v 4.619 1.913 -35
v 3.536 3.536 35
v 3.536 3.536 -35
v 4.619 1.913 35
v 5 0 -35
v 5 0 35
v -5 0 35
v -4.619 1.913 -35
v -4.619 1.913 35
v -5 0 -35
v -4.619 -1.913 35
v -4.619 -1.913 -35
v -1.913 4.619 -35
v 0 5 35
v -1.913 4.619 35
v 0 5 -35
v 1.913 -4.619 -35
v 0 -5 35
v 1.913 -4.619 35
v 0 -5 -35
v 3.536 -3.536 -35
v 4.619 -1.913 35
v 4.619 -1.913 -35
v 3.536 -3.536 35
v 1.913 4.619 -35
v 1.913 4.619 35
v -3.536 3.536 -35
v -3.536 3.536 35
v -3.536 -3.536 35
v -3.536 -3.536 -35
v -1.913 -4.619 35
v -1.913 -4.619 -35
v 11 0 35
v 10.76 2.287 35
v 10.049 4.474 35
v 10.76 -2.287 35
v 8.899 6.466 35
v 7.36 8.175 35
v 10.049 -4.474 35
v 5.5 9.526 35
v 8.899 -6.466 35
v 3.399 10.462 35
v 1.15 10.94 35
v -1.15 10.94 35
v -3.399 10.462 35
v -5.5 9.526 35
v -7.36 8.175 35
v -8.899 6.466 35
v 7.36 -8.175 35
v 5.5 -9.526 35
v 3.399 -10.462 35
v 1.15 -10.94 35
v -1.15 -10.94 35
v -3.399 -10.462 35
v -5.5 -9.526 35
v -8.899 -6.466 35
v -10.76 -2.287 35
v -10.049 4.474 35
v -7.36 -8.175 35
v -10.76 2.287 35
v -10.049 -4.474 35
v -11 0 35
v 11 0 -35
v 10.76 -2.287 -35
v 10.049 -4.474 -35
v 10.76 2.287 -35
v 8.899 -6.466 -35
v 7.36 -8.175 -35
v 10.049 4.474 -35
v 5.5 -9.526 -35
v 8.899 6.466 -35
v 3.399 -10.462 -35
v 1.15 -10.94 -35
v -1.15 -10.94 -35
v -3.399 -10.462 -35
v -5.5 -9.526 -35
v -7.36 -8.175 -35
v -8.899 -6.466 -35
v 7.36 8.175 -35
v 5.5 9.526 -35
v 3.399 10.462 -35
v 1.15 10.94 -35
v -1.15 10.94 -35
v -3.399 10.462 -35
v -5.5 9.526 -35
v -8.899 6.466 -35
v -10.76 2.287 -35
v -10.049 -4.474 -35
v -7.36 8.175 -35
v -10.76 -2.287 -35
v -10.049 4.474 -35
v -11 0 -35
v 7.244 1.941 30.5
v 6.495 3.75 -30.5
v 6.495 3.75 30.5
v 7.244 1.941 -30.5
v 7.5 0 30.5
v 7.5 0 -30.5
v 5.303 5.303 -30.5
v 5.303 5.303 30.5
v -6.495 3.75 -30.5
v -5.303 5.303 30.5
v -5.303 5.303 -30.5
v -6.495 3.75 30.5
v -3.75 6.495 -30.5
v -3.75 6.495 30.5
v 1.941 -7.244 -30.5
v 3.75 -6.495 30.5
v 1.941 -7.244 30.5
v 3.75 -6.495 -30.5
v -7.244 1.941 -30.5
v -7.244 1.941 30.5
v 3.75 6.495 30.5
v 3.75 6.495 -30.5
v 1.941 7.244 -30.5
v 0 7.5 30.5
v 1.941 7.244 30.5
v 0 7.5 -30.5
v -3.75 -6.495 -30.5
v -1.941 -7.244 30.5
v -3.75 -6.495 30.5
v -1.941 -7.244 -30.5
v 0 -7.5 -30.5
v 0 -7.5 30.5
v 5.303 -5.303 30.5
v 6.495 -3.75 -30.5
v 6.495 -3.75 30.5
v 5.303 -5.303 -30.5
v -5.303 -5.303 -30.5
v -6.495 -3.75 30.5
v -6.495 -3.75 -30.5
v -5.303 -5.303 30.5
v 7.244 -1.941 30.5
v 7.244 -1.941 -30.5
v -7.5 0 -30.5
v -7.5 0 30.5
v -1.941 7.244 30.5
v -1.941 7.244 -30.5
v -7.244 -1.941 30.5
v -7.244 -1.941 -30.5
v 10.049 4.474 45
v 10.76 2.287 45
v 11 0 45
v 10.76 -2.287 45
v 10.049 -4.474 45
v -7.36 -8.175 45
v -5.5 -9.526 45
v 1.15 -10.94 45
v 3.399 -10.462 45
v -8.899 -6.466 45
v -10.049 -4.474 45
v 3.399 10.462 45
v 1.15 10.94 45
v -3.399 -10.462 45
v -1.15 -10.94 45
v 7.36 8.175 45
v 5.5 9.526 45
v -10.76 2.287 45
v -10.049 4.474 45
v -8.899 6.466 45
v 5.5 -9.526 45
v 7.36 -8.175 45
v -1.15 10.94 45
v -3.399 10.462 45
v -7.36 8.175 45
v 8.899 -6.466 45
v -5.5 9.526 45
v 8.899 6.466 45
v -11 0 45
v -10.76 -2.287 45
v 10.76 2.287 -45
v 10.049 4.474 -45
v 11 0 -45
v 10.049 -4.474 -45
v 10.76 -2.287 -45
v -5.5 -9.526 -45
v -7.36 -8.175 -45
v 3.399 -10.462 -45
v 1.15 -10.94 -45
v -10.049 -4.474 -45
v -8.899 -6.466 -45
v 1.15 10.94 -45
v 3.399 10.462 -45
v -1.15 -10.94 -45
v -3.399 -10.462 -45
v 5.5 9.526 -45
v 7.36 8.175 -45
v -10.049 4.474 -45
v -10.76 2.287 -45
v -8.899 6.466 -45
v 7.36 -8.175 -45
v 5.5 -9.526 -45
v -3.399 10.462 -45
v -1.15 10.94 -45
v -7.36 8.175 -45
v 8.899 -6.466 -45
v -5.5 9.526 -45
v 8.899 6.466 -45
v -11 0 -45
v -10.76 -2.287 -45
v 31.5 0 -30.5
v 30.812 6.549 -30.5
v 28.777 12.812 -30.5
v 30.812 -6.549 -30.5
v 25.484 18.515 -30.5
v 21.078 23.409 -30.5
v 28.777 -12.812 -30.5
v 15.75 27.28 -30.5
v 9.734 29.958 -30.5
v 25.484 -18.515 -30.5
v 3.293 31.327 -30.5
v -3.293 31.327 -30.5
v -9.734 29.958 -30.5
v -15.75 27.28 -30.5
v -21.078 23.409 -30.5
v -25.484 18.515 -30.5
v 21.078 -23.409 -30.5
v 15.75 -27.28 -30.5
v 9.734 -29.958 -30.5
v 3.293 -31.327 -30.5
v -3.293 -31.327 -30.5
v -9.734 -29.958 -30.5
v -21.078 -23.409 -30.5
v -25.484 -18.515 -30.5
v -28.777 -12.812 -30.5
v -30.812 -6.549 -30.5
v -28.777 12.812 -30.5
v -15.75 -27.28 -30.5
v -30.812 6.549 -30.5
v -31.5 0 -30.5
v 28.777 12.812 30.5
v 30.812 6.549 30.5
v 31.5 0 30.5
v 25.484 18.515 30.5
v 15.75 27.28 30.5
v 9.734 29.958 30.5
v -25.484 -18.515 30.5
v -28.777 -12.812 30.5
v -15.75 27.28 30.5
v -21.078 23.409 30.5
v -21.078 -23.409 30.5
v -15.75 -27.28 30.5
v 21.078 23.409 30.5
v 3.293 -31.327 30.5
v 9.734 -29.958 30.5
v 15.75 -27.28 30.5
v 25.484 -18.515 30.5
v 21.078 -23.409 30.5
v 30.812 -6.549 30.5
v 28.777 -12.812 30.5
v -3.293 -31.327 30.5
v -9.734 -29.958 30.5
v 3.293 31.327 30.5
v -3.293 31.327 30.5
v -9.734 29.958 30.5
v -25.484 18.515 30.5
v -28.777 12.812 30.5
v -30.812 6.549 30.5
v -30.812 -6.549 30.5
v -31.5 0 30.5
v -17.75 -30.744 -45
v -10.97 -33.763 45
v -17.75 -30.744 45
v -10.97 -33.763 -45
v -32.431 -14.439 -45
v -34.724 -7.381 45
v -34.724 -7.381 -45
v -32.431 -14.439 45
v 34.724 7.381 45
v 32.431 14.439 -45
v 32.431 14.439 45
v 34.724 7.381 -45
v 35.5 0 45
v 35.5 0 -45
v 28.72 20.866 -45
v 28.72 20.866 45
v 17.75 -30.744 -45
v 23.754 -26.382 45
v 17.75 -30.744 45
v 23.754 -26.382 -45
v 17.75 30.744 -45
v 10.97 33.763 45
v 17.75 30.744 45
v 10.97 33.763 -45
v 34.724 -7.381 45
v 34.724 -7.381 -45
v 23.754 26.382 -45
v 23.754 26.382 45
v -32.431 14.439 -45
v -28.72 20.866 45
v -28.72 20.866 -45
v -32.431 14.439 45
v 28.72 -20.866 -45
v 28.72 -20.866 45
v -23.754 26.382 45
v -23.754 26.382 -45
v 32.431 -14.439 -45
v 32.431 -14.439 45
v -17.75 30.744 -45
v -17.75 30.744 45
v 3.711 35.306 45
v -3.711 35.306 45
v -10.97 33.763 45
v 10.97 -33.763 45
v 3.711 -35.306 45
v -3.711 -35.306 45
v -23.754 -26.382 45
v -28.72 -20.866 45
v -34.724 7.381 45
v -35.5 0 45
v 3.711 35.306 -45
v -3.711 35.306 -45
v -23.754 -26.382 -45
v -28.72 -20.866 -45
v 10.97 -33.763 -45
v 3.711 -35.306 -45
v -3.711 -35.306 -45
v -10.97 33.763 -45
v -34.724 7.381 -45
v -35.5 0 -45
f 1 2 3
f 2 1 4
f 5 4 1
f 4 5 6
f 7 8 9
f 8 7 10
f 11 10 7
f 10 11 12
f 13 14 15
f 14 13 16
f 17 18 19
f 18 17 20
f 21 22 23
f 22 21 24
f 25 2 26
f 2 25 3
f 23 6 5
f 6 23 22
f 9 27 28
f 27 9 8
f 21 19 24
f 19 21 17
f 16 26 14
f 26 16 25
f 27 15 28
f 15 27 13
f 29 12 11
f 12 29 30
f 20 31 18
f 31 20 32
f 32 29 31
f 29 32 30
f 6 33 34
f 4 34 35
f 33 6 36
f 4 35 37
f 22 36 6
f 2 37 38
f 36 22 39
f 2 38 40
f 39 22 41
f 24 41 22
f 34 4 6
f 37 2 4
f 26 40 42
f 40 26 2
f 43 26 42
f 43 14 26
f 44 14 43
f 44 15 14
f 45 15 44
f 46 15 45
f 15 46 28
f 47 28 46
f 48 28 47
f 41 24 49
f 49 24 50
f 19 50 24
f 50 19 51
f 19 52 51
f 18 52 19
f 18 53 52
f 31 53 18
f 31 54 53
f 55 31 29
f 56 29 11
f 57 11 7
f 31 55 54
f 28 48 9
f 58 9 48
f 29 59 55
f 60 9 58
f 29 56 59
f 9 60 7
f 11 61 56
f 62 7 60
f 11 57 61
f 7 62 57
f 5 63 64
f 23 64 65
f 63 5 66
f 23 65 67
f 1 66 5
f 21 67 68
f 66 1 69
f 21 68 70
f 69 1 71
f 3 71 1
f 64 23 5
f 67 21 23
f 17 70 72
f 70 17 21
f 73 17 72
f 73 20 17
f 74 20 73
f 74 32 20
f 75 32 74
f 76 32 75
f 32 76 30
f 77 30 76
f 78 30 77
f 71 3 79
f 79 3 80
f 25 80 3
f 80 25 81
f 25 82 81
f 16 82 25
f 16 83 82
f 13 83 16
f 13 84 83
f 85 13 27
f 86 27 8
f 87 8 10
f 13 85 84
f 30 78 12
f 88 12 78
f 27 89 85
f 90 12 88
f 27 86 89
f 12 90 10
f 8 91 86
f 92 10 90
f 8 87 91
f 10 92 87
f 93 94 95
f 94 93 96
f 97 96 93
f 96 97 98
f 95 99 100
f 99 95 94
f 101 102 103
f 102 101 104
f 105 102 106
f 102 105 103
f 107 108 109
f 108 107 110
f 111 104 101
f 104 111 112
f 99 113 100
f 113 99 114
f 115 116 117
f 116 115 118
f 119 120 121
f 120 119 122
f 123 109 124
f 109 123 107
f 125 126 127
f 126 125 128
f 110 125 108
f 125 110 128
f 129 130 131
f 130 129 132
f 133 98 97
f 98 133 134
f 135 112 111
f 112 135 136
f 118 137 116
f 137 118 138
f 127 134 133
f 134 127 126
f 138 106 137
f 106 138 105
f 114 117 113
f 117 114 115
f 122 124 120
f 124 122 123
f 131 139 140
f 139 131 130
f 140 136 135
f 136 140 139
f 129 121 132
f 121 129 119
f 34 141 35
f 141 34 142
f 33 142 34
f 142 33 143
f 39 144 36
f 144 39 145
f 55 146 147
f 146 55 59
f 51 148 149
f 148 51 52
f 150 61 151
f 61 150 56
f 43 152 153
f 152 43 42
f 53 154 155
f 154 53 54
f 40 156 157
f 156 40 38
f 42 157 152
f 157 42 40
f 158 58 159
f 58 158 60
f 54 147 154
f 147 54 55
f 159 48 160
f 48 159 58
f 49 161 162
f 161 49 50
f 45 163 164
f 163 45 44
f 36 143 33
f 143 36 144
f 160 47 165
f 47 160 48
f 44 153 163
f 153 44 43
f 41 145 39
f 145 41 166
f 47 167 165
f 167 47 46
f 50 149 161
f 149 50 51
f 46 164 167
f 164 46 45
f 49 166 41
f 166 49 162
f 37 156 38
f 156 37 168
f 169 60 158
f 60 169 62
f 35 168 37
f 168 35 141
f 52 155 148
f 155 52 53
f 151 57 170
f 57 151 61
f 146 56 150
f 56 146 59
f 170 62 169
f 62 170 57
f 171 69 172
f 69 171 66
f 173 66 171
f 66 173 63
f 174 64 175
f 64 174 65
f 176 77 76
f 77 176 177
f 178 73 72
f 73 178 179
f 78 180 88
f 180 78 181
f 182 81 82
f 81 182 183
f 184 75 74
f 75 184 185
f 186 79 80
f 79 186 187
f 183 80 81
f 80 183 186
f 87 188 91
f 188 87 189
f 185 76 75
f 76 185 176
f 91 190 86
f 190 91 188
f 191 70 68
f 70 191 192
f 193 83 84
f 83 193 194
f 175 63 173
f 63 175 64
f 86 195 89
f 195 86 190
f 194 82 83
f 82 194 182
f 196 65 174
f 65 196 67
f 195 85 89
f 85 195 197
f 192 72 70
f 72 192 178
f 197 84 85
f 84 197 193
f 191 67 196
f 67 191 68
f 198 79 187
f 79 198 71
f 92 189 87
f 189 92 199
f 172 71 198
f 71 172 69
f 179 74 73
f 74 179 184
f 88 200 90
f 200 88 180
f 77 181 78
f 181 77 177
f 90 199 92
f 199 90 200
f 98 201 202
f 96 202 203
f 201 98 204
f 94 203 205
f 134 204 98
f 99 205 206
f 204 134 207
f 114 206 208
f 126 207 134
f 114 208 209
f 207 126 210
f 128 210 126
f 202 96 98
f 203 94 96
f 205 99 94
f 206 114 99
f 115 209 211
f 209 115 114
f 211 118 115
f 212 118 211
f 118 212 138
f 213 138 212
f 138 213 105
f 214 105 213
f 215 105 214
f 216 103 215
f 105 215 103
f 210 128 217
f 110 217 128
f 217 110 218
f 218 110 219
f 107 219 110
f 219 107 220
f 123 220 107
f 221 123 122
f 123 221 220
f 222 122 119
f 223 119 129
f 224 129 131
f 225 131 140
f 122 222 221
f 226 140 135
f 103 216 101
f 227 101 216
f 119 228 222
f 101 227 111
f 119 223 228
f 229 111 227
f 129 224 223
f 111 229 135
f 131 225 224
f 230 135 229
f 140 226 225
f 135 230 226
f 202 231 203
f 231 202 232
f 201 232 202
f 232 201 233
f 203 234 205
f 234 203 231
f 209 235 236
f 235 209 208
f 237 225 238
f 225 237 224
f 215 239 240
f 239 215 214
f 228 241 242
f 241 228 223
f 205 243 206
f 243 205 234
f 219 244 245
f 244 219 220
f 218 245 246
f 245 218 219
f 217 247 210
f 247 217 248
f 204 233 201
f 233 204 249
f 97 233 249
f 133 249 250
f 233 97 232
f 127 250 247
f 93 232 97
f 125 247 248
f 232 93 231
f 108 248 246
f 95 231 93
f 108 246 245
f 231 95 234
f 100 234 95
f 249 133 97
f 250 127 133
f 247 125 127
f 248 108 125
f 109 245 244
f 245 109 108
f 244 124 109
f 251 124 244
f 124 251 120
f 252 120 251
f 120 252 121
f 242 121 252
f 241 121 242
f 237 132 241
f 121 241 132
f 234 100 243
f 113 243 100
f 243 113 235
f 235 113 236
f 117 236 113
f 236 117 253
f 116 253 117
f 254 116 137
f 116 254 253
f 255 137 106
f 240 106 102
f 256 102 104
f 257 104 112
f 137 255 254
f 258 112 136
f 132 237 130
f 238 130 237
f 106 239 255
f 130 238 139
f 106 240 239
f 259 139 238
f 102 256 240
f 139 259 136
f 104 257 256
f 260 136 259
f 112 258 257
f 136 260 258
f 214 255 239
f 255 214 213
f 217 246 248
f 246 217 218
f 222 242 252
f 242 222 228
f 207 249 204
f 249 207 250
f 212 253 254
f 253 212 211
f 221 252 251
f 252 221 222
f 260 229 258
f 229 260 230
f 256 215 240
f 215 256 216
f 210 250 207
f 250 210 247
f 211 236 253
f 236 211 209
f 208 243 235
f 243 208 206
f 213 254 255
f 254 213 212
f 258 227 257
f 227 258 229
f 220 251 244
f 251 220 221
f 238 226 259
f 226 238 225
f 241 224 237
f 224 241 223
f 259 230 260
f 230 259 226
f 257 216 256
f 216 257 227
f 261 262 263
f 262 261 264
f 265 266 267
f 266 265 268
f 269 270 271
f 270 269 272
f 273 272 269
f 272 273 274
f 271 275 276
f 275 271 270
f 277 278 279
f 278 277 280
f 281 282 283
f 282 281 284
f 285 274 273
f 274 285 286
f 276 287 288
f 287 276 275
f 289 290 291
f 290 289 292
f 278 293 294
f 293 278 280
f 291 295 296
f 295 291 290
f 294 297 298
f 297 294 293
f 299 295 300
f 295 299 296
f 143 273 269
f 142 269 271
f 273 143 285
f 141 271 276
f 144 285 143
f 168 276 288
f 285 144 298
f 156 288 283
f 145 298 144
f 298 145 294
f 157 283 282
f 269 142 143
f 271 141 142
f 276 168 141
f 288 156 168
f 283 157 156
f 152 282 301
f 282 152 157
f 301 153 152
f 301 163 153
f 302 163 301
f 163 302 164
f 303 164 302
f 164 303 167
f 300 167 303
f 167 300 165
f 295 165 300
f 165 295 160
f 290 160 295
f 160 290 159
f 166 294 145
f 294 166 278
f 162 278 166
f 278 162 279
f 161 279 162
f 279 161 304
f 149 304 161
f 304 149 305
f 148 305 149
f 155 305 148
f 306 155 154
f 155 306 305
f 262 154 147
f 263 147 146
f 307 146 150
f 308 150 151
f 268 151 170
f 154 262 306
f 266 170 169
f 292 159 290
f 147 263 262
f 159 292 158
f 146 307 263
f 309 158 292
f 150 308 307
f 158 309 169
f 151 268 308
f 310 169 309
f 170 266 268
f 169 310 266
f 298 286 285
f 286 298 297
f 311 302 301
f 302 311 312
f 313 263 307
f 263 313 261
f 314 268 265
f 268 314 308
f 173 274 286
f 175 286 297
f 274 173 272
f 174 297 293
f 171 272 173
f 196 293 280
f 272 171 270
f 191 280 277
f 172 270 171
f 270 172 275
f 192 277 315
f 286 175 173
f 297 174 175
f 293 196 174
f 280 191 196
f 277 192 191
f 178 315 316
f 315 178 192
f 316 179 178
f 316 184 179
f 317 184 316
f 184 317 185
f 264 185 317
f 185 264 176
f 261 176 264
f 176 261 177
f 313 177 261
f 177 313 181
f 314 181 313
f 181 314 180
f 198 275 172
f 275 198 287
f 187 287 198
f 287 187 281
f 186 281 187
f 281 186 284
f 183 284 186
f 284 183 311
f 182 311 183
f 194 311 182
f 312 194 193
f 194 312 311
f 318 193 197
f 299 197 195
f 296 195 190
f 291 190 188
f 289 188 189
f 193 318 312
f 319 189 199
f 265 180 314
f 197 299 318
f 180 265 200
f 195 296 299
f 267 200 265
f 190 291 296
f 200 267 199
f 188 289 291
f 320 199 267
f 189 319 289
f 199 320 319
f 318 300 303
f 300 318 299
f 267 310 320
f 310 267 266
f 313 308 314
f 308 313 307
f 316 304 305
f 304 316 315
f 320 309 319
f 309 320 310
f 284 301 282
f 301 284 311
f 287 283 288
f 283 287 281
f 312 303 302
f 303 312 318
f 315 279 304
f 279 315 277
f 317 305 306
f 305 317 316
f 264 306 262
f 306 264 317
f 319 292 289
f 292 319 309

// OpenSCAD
union(){
difference(){
cylinder(h = 90, r=15/2,center=true);
union(){
cylinder(h = 95, r=10/2,center=true);
translate(v=[0,0,45]){
cylinder(h = 20, r=22/2,center=true);
}
translate(v=[0,0,-45]){
cylinder(h = 20, r=22/2,center=true);
}
}
}

difference(){



cylinder(h = 90, r=71/2,center=true);


union(){
cylinder(h = 95, r=10/2,center=true);

translate(v=[0,0,45]){
cylinder(h = 20, r=22/2,center=true);
}

translate(v=[0,0,-45]){
cylinder(h = 20, r=22/2,center=true);
}


cylinder(h = 61, r=63/2,center=true);

}
}}
